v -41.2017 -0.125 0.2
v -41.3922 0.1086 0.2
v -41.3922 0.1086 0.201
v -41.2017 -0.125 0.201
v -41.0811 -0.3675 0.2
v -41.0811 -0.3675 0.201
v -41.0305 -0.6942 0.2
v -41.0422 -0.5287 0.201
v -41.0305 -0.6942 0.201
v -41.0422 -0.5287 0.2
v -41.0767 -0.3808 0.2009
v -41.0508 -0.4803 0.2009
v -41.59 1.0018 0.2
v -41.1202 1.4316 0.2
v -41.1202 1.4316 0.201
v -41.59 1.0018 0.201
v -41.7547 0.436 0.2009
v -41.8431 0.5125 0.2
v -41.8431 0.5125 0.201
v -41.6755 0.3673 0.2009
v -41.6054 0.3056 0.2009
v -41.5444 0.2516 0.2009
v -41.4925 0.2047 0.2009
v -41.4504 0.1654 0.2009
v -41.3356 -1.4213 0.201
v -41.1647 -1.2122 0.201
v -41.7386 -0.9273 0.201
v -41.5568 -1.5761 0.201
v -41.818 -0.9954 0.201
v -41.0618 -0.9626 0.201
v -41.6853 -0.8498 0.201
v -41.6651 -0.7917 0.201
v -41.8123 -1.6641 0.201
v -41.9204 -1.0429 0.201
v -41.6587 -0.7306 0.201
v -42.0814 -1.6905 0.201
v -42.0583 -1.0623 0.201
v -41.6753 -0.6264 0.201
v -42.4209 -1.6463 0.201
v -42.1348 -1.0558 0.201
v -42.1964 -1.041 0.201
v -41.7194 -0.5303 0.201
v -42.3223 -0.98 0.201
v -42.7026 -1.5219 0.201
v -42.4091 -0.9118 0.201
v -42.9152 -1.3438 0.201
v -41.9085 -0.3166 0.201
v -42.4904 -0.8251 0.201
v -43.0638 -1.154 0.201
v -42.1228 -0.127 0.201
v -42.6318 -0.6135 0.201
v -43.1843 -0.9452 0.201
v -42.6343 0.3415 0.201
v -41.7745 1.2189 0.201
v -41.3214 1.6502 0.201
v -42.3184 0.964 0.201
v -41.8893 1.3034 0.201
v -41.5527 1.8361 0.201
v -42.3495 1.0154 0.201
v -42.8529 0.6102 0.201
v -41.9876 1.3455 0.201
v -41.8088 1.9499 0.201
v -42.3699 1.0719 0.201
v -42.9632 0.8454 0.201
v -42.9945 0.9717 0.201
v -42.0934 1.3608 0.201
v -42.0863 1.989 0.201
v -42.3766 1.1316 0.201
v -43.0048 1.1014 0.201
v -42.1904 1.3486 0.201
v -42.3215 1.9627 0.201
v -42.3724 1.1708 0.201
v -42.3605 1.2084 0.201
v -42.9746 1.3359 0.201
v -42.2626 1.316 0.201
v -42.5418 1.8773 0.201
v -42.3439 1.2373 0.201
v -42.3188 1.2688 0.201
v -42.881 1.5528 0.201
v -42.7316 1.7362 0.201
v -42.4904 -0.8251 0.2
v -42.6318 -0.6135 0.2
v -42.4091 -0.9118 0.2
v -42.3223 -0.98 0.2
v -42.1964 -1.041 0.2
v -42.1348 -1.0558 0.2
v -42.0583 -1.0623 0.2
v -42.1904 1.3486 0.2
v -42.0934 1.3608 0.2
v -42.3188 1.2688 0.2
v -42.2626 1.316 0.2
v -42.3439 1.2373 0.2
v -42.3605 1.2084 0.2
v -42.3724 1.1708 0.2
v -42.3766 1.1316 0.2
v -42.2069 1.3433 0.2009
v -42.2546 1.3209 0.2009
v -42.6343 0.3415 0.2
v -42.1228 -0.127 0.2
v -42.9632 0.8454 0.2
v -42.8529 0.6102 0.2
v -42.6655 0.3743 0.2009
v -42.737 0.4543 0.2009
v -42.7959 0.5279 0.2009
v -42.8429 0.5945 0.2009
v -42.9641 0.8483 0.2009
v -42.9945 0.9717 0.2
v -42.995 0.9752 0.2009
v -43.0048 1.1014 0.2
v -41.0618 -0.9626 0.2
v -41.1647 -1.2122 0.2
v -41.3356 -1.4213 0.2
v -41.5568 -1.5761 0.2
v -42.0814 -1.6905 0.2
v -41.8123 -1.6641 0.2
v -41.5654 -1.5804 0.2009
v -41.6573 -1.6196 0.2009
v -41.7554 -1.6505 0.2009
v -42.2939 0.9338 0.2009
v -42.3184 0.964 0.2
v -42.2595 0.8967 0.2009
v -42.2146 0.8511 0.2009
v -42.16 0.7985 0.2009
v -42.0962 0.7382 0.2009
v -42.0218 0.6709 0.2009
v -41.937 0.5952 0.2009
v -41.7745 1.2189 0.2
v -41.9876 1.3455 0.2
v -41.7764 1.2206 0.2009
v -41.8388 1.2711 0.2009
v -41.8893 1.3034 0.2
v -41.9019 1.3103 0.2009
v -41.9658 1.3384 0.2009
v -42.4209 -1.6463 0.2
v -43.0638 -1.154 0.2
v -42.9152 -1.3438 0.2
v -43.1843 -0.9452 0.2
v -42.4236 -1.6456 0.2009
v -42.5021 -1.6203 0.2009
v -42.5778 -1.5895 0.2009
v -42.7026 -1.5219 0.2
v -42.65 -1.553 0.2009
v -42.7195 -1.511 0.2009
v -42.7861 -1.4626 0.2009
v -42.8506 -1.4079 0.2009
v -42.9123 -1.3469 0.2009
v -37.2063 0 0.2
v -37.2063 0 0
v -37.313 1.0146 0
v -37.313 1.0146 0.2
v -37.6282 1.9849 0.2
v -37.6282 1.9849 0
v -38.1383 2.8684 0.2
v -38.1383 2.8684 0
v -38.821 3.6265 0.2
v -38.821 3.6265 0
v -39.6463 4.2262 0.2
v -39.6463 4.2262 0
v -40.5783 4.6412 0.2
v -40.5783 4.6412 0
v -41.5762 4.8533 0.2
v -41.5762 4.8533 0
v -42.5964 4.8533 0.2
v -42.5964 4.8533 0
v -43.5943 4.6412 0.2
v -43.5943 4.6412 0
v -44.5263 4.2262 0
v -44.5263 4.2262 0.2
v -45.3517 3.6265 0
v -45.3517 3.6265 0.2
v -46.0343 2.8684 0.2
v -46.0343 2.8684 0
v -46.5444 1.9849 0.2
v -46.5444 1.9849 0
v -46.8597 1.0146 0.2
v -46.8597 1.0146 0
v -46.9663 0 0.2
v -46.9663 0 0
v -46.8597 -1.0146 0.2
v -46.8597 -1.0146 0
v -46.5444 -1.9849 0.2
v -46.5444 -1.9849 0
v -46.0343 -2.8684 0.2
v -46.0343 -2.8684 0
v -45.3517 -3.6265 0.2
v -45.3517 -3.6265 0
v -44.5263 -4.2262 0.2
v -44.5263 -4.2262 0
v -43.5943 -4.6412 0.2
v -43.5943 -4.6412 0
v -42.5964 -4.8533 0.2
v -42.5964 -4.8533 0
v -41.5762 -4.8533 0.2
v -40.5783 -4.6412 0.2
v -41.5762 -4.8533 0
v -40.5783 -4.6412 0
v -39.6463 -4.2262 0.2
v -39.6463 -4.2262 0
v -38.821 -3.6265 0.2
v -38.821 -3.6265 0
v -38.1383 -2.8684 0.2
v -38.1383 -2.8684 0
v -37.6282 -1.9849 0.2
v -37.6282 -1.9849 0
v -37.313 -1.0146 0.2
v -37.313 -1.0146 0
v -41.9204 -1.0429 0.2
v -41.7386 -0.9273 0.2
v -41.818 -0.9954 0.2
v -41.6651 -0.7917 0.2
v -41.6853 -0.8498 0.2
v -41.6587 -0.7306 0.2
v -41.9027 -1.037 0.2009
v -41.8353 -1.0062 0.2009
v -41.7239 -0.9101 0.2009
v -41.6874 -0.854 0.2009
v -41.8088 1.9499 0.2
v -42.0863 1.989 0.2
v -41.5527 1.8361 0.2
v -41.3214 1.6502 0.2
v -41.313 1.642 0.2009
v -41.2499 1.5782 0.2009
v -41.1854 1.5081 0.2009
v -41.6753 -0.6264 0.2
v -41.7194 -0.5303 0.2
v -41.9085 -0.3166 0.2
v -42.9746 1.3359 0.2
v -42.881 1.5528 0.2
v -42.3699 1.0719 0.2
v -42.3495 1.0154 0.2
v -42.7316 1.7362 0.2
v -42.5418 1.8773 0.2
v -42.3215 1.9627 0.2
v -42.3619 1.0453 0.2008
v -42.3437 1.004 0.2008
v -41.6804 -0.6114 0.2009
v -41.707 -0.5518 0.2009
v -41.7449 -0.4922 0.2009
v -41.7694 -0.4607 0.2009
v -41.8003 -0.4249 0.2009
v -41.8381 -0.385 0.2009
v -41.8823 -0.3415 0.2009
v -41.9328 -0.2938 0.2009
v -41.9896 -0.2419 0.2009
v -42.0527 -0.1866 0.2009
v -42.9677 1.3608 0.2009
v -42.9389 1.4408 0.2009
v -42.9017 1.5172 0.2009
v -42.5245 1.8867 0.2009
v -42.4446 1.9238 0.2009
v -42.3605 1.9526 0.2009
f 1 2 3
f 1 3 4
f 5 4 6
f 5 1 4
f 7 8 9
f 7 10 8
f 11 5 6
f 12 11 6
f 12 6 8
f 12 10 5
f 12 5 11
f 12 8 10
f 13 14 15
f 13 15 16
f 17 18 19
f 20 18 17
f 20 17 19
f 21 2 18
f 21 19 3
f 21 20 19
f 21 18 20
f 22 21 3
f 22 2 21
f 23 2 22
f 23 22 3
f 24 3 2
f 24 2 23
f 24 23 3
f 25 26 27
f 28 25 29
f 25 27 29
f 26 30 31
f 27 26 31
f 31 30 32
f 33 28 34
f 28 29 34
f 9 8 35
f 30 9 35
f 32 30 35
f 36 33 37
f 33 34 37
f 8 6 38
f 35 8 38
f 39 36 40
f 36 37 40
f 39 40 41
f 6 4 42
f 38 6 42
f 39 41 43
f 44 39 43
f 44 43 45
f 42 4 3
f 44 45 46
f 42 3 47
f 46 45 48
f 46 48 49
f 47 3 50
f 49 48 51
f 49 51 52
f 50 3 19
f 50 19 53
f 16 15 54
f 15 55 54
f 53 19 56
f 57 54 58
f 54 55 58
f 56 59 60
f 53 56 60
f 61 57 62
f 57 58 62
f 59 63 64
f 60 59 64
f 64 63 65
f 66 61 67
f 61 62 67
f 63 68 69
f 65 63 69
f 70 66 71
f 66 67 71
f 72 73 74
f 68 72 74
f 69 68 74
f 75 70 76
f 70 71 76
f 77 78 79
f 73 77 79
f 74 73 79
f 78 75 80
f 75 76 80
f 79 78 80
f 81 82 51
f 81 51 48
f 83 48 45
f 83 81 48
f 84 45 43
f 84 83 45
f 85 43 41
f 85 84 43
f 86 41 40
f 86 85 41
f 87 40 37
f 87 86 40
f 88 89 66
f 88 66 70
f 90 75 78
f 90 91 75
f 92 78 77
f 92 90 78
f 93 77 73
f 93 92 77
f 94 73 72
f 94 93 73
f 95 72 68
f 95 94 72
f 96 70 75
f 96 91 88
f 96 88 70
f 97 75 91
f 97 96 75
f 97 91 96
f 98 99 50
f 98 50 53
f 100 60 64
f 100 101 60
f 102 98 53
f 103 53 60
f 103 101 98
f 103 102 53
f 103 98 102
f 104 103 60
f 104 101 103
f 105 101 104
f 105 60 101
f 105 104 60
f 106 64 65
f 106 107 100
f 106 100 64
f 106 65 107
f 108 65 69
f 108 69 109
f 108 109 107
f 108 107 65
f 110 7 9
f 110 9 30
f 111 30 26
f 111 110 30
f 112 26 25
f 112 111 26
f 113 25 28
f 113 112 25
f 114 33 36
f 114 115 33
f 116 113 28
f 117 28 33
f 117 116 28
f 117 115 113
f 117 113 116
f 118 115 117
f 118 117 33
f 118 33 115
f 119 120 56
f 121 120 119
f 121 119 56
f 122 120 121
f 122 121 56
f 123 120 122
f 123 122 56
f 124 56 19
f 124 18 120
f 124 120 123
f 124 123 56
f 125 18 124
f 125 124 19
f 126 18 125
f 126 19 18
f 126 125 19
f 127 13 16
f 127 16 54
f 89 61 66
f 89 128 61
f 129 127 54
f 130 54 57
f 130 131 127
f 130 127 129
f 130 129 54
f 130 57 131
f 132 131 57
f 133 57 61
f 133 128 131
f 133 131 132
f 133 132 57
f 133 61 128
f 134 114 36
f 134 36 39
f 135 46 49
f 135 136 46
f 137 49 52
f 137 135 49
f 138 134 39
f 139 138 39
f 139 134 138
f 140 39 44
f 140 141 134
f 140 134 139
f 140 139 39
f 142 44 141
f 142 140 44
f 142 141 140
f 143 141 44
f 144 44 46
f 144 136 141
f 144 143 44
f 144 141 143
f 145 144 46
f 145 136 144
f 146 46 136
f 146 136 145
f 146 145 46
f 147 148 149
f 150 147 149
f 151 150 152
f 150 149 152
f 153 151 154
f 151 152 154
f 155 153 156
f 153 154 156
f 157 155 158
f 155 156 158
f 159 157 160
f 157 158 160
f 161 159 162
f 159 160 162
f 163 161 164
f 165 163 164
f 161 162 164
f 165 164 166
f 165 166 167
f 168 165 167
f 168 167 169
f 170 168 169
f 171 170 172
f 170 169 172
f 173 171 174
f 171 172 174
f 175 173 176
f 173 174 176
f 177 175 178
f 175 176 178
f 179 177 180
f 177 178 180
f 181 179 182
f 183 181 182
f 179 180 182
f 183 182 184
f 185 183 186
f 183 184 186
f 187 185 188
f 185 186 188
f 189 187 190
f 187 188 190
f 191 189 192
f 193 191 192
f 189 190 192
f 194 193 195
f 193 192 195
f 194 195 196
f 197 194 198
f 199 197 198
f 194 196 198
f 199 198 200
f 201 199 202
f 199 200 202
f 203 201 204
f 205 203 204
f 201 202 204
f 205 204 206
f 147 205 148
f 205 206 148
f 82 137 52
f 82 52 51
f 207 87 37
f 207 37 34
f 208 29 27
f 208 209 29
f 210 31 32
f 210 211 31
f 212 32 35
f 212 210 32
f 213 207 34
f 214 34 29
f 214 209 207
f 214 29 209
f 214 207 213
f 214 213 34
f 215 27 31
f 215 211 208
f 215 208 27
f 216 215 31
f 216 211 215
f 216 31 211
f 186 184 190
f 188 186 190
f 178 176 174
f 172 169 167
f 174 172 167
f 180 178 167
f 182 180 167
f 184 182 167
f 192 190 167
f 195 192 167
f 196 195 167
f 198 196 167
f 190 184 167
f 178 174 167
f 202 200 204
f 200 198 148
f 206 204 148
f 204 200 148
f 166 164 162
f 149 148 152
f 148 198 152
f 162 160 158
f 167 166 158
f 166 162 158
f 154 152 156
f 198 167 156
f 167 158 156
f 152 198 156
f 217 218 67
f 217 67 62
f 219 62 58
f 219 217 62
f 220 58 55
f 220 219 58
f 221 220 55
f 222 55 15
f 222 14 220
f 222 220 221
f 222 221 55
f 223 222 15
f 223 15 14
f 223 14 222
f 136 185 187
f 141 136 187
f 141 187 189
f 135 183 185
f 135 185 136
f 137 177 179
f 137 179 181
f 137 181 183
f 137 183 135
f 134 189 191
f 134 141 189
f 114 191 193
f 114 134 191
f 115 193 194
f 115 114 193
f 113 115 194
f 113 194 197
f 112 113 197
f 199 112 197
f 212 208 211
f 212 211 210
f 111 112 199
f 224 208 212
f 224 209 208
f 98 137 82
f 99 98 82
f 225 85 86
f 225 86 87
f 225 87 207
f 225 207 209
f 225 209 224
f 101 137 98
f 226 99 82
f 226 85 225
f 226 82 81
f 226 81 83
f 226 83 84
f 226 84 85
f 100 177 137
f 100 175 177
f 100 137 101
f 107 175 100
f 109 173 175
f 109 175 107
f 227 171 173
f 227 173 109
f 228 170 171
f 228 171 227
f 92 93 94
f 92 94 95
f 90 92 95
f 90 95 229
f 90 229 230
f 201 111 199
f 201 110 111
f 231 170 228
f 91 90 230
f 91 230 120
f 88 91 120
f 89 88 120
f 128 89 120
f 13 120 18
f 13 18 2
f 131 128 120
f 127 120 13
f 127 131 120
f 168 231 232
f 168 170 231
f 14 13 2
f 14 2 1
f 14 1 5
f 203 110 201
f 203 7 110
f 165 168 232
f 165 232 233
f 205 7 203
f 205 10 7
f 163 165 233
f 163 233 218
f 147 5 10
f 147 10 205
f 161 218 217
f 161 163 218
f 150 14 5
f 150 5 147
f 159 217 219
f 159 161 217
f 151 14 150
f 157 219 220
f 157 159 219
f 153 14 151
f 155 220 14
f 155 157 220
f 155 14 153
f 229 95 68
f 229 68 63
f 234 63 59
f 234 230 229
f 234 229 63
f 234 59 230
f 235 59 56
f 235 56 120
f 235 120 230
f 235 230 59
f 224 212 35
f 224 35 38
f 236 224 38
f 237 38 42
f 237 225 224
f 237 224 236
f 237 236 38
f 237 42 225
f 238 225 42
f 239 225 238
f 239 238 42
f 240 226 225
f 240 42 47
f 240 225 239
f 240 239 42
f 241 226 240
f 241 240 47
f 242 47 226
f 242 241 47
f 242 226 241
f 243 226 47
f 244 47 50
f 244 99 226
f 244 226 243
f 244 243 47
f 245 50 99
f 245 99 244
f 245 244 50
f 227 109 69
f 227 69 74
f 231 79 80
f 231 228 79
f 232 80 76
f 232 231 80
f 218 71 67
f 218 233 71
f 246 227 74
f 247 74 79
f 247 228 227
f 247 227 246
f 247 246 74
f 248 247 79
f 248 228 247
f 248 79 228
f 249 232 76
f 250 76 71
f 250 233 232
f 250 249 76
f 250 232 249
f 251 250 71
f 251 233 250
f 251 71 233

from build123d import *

# Parameters (mm, degrees)
SKETCH1_R           = 4.88
BOSS_EXTRUDE1_DEPTH = 0.2
BOSS_EXTRUDE2_DEPTH = 0.001


with BuildPart() as part:
    # Sketch1 → Boss-Extrude1 (new body)
    with BuildSketch(Plane.XY):
        with Locations((-42.086326732, 0)):
            Circle(SKETCH1_R)
    extrude(amount=BOSS_EXTRUDE1_DEPTH)

    # Sketch2 → Boss-Extrude2 (add)
    with BuildSketch(Plane.XY.offset(0.2)):
        with BuildLine():
            Line((-41.120198615, 1.43163704), (-41.589950217, 1.001849379))
            add(Edge.make_bspline(
                [(-41.589950217, 1.001849379), (-41.610072362, 1.030233756), (-41.648704073, 1.084727801), (-41.711322047, 1.157696611), (-41.773657269, 1.219944437), (-41.836287237, 1.271211235), (-41.899767079, 1.311185521), (-41.963986602, 1.339487758), (-42.02858173, 1.357479758), (-42.071979684, 1.359720195), (-42.093355666, 1.360823738)],
                knots=[0, 0, 0, 0, 1.299362458, 2.494594718, 3.587462134, 4.587049575, 5.512617175, 6.380583204, 7.202344345, 8, 8, 8, 8], degree=3))
            add(Edge.make_bspline(
                [(-42.093355666, 1.360823738), (-42.113294569, 1.360124483), (-42.151791351, 1.358774403), (-42.20667137, 1.345354714), (-42.255394633, 1.322194302), (-42.297913587, 1.291910114), (-42.331594872, 1.255424689), (-42.358486766, 1.21716086), (-42.373629162, 1.174926245), (-42.3756222, 1.145917809), (-42.376608871, 1.131556912)],
                knots=[0, 0, 0, 0, 1.185010067, 2.2879431, 3.333075148, 4.379039566, 5.372662701, 6.27520591, 7.14612461, 8, 8, 8, 8], degree=3))
            add(Edge.make_bspline(
                [(-42.376608871, 1.131556912), (-42.375990574, 1.116988924), (-42.37474541, 1.087651022), (-42.362718816, 1.044652672), (-42.344591305, 1.002638279), (-42.327269728, 0.977062118), (-42.318415762, 0.963988803)],
                knots=[0, 0, 0, 0, 0.967525499, 1.948461899, 2.951351359, 4, 4, 4, 4], degree=3))
            add(Edge.make_bspline(
                [(-42.318415762, 0.963988803), (-42.31036655, 0.953827051), (-42.291838325, 0.930436041), (-42.256508796, 0.893388326), (-42.212142327, 0.848001634), (-42.157031604, 0.795836678), (-42.093464423, 0.735017403), (-42.018494364, 0.667934638), (-41.934279393, 0.592510908), (-41.874421342, 0.539988553), (-41.843055185, 0.512466367)],
                knots=[0, 0, 0, 0, 0.473873513, 1.090794244, 1.870441696, 2.795289791, 3.865433203, 5.087734844, 6.473946851, 8, 8, 8, 8], degree=3))
            add(Edge.make_bspline(
                [(-41.843055185, 0.512466367), (-41.813613535, 0.486986103), (-41.757739399, 0.438629857), (-41.678241599, 0.369995929), (-41.608376273, 0.308247658), (-41.547125643, 0.254311753), (-41.495418209, 0.207622303), (-41.453036591, 0.167956132), (-41.419463171, 0.136085468), (-41.400378648, 0.116835568), (-41.392233871, 0.108620213)],
                knots=[0, 0, 0, 0, 1.543621617, 2.929473131, 4.163658386, 5.240097082, 6.164993805, 6.925417477, 7.541396219, 8, 8, 8, 8], degree=3))
            add(Edge.make_bspline(
                [(-41.392233871, 0.108620213), (-41.361334287, 0.075180245), (-41.301934434, 0.010896882), (-41.224735565, -0.088722113), (-41.161198399, -0.185970564), (-41.112044842, -0.28267836), (-41.074922099, -0.380240801), (-41.048750074, -0.481050601), (-41.033075474, -0.58616116), (-41.031335227, -0.657886284), (-41.030455025, -0.694164242)],
                knots=[0, 0, 0, 0, 1.206664779, 2.319633467, 3.337109185, 4.282041471, 5.190008762, 6.099243693, 7.03861361, 8, 8, 8, 8], degree=3))
            add(Edge.make_bspline(
                [(-41.030455025, -0.694164242), (-41.03108153, -0.729512664), (-41.032310757, -0.798867582), (-41.047366424, -0.900358175), (-41.068834923, -0.997489076), (-41.102028988, -1.089203366), (-41.142485717, -1.177006505), (-41.193204071, -1.2595308), (-41.252765823, -1.337611431), (-41.321032735, -1.409852611), (-41.396544047, -1.475406475), (-41.477537106, -1.533764073), (-41.564803902, -1.581945703), (-41.657598842, -1.621619839), (-41.755872254, -1.652177389), (-41.859507066, -1.674762266), (-41.968661794, -1.688317354), (-42.043303369, -1.689734377), (-42.081436596, -1.690458313)],
                knots=[0, 0, 0, 0, 1.043214005, 2.046824704, 3.02475056, 3.976699089, 4.921714032, 5.875962561, 6.831408892, 7.817874052, 8.806269674, 9.781291748, 10.760897367, 11.74438705, 12.757449933, 13.795994037, 14.874007457, 16, 16, 16, 16], degree=3))
            add(Edge.make_bspline(
                [(-42.081436596, -1.690458313), (-42.111370853, -1.689927259), (-42.170657851, -1.688875468), (-42.258037922, -1.680288472), (-42.342413259, -1.666429973), (-42.42368882, -1.646566604), (-42.502230766, -1.621397021), (-42.578042322, -1.59065334), (-42.650600136, -1.553859045), (-42.720453215, -1.511770773), (-42.787261986, -1.462900746), (-42.851871221, -1.408248094), (-42.913639159, -1.346972236), (-42.972862459, -1.279218087), (-43.029162194, -1.204793783), (-43.084381256, -1.124735821), (-43.136065543, -1.037558433), (-43.167993227, -0.97640279), (-43.184301179, -0.945165845)],
                knots=[0, 0, 0, 0, 1.016823716, 2.013894106, 2.979844003, 3.91962641, 4.853723003, 5.779685073, 6.695824784, 7.614987388, 8.547259901, 9.504950863, 10.487499108, 11.500346958, 12.559593716, 13.656357062, 14.802919212, 16, 16, 16, 16], degree=3))
            Line((-43.184301179, -0.945165845), (-42.631817205, -0.613535236))
            add(Edge.make_bspline(
                [(-42.631817205, -0.613535236), (-42.611418394, -0.64899325), (-42.572312131, -0.716969293), (-42.506042911, -0.808303722), (-42.438153479, -0.886516541), (-42.367074292, -0.950225336), (-42.293669645, -1.000281972), (-42.217584977, -1.036055918), (-42.138766834, -1.058199949), (-42.085079495, -1.060904247), (-42.058299576, -1.062253185)],
                knots=[0, 0, 0, 0, 1.283663364, 2.460892379, 3.537111102, 4.529833553, 5.449777664, 6.316464042, 7.160231139, 8, 8, 8, 8], degree=3))
            add(Edge.make_bspline(
                [(-42.058299576, -1.062253185), (-42.031060565, -1.061151569), (-41.978212917, -1.059014274), (-41.902779662, -1.039272727), (-41.833619597, -1.00827705), (-41.773838148, -0.964050493), (-41.723218986, -0.913006324), (-41.685859139, -0.856217352), (-41.662389431, -0.794773055), (-41.659908114, -0.752089805), (-41.658660153, -0.730622576)],
                knots=[0, 0, 0, 0, 1.13588714, 2.203786484, 3.234766741, 4.283437687, 5.291419208, 6.222934724, 7.106237994, 8, 8, 8, 8], degree=3))
            add(Edge.make_bspline(
                [(-41.658660153, -0.730622576), (-41.659812594, -0.710650812), (-41.662153666, -0.670080087), (-41.679397282, -0.609757943), (-41.706354313, -0.549463231), (-41.738246381, -0.500007878), (-41.770700555, -0.458600251), (-41.801734064, -0.422722416), (-41.83952467, -0.383083689), (-41.883976551, -0.339634207), (-41.934502382, -0.291991475), (-41.991144725, -0.240160157), (-42.054552194, -0.184596825), (-42.099368718, -0.146747633), (-42.122802781, -0.12695671)],
                knots=[0, 0, 0, 0, 0.916159276, 1.861089862, 2.860218735, 3.940849679, 4.552606315, 5.27541173, 6.11797699, 7.06649574, 8.129236253, 9.306560635, 10.591630461, 12, 12, 12, 12], degree=3))
            add(Edge.make_bspline(
                [(-42.122802781, -0.12695671), (-42.167351868, -0.089263911), (-42.252855049, -0.016920021), (-42.373681891, 0.089929627), (-42.482557695, 0.189790414), (-42.578542091, 0.283896837), (-42.662858071, 0.370510968), (-42.734934608, 0.450336322), (-42.79397991, 0.52398864), (-42.856112359, 0.611224883), (-42.915150608, 0.717528239), (-42.966176408, 0.845423499), (-42.999279794, 0.973302532), (-43.002988568, 1.059153471), (-43.004813999, 1.101408674)],
                knots=[0, 0, 0, 0, 1.345494975, 2.582412109, 3.71882943, 4.751509156, 5.681369928, 6.505683931, 7.230279997, 7.856715994, 8.973648664, 10.023341002, 11.027102913, 12, 12, 12, 12], degree=3))
            add(Edge.make_bspline(
                [(-43.004813999, 1.101408674), (-43.004054805, 1.131373797), (-43.00255911, 1.190408307), (-42.989217283, 1.277209952), (-42.969277414, 1.360966246), (-42.940318999, 1.441371608), (-42.902734473, 1.518325328), (-42.857089527, 1.592204125), (-42.80267538, 1.662328036), (-42.74135431, 1.728650574), (-42.67379419, 1.789261826), (-42.601597617, 1.842757329), (-42.525173229, 1.887940409), (-42.444988552, 1.925423055), (-42.360546715, 1.954113639), (-42.272469796, 1.974450955), (-42.180631467, 1.986546942), (-42.118165017, 1.988191251), (-42.086344448, 1.989028867)],
                knots=[0, 0, 0, 0, 1.010766082, 1.991317756, 2.957454644, 3.913069143, 4.869106762, 5.843196583, 6.838735724, 7.860187025, 8.887984031, 9.89767229, 10.887916223, 11.879572884, 12.879850636, 13.892031539, 14.926195476, 16, 16, 16, 16], degree=3))
            add(Edge.make_bspline(
                [(-42.086344448, 1.989028867), (-42.045106566, 1.987520297), (-41.962956318, 1.984515066), (-41.841494807, 1.961015141), (-41.722856281, 1.924059033), (-41.627255134, 1.879475555), (-41.551187086, 1.836287519), (-41.492888033, 1.796525416), (-41.433565608, 1.750975789), (-41.372741413, 1.699495101), (-41.311545656, 1.641113386), (-41.248238248, 1.577220469), (-41.183681831, 1.507264164), (-41.141730396, 1.457287704), (-41.120198615, 1.43163704)],
                knots=[0, 0, 0, 0, 1.282922637, 2.555718331, 3.837320111, 5.142675274, 5.830281639, 6.55870424, 7.337177975, 8.157850921, 9.037902056, 9.96903443, 10.957596896, 12, 12, 12, 12], degree=3))
        make_face()
    extrude(amount=BOSS_EXTRUDE2_DEPTH)


solid = part.part
